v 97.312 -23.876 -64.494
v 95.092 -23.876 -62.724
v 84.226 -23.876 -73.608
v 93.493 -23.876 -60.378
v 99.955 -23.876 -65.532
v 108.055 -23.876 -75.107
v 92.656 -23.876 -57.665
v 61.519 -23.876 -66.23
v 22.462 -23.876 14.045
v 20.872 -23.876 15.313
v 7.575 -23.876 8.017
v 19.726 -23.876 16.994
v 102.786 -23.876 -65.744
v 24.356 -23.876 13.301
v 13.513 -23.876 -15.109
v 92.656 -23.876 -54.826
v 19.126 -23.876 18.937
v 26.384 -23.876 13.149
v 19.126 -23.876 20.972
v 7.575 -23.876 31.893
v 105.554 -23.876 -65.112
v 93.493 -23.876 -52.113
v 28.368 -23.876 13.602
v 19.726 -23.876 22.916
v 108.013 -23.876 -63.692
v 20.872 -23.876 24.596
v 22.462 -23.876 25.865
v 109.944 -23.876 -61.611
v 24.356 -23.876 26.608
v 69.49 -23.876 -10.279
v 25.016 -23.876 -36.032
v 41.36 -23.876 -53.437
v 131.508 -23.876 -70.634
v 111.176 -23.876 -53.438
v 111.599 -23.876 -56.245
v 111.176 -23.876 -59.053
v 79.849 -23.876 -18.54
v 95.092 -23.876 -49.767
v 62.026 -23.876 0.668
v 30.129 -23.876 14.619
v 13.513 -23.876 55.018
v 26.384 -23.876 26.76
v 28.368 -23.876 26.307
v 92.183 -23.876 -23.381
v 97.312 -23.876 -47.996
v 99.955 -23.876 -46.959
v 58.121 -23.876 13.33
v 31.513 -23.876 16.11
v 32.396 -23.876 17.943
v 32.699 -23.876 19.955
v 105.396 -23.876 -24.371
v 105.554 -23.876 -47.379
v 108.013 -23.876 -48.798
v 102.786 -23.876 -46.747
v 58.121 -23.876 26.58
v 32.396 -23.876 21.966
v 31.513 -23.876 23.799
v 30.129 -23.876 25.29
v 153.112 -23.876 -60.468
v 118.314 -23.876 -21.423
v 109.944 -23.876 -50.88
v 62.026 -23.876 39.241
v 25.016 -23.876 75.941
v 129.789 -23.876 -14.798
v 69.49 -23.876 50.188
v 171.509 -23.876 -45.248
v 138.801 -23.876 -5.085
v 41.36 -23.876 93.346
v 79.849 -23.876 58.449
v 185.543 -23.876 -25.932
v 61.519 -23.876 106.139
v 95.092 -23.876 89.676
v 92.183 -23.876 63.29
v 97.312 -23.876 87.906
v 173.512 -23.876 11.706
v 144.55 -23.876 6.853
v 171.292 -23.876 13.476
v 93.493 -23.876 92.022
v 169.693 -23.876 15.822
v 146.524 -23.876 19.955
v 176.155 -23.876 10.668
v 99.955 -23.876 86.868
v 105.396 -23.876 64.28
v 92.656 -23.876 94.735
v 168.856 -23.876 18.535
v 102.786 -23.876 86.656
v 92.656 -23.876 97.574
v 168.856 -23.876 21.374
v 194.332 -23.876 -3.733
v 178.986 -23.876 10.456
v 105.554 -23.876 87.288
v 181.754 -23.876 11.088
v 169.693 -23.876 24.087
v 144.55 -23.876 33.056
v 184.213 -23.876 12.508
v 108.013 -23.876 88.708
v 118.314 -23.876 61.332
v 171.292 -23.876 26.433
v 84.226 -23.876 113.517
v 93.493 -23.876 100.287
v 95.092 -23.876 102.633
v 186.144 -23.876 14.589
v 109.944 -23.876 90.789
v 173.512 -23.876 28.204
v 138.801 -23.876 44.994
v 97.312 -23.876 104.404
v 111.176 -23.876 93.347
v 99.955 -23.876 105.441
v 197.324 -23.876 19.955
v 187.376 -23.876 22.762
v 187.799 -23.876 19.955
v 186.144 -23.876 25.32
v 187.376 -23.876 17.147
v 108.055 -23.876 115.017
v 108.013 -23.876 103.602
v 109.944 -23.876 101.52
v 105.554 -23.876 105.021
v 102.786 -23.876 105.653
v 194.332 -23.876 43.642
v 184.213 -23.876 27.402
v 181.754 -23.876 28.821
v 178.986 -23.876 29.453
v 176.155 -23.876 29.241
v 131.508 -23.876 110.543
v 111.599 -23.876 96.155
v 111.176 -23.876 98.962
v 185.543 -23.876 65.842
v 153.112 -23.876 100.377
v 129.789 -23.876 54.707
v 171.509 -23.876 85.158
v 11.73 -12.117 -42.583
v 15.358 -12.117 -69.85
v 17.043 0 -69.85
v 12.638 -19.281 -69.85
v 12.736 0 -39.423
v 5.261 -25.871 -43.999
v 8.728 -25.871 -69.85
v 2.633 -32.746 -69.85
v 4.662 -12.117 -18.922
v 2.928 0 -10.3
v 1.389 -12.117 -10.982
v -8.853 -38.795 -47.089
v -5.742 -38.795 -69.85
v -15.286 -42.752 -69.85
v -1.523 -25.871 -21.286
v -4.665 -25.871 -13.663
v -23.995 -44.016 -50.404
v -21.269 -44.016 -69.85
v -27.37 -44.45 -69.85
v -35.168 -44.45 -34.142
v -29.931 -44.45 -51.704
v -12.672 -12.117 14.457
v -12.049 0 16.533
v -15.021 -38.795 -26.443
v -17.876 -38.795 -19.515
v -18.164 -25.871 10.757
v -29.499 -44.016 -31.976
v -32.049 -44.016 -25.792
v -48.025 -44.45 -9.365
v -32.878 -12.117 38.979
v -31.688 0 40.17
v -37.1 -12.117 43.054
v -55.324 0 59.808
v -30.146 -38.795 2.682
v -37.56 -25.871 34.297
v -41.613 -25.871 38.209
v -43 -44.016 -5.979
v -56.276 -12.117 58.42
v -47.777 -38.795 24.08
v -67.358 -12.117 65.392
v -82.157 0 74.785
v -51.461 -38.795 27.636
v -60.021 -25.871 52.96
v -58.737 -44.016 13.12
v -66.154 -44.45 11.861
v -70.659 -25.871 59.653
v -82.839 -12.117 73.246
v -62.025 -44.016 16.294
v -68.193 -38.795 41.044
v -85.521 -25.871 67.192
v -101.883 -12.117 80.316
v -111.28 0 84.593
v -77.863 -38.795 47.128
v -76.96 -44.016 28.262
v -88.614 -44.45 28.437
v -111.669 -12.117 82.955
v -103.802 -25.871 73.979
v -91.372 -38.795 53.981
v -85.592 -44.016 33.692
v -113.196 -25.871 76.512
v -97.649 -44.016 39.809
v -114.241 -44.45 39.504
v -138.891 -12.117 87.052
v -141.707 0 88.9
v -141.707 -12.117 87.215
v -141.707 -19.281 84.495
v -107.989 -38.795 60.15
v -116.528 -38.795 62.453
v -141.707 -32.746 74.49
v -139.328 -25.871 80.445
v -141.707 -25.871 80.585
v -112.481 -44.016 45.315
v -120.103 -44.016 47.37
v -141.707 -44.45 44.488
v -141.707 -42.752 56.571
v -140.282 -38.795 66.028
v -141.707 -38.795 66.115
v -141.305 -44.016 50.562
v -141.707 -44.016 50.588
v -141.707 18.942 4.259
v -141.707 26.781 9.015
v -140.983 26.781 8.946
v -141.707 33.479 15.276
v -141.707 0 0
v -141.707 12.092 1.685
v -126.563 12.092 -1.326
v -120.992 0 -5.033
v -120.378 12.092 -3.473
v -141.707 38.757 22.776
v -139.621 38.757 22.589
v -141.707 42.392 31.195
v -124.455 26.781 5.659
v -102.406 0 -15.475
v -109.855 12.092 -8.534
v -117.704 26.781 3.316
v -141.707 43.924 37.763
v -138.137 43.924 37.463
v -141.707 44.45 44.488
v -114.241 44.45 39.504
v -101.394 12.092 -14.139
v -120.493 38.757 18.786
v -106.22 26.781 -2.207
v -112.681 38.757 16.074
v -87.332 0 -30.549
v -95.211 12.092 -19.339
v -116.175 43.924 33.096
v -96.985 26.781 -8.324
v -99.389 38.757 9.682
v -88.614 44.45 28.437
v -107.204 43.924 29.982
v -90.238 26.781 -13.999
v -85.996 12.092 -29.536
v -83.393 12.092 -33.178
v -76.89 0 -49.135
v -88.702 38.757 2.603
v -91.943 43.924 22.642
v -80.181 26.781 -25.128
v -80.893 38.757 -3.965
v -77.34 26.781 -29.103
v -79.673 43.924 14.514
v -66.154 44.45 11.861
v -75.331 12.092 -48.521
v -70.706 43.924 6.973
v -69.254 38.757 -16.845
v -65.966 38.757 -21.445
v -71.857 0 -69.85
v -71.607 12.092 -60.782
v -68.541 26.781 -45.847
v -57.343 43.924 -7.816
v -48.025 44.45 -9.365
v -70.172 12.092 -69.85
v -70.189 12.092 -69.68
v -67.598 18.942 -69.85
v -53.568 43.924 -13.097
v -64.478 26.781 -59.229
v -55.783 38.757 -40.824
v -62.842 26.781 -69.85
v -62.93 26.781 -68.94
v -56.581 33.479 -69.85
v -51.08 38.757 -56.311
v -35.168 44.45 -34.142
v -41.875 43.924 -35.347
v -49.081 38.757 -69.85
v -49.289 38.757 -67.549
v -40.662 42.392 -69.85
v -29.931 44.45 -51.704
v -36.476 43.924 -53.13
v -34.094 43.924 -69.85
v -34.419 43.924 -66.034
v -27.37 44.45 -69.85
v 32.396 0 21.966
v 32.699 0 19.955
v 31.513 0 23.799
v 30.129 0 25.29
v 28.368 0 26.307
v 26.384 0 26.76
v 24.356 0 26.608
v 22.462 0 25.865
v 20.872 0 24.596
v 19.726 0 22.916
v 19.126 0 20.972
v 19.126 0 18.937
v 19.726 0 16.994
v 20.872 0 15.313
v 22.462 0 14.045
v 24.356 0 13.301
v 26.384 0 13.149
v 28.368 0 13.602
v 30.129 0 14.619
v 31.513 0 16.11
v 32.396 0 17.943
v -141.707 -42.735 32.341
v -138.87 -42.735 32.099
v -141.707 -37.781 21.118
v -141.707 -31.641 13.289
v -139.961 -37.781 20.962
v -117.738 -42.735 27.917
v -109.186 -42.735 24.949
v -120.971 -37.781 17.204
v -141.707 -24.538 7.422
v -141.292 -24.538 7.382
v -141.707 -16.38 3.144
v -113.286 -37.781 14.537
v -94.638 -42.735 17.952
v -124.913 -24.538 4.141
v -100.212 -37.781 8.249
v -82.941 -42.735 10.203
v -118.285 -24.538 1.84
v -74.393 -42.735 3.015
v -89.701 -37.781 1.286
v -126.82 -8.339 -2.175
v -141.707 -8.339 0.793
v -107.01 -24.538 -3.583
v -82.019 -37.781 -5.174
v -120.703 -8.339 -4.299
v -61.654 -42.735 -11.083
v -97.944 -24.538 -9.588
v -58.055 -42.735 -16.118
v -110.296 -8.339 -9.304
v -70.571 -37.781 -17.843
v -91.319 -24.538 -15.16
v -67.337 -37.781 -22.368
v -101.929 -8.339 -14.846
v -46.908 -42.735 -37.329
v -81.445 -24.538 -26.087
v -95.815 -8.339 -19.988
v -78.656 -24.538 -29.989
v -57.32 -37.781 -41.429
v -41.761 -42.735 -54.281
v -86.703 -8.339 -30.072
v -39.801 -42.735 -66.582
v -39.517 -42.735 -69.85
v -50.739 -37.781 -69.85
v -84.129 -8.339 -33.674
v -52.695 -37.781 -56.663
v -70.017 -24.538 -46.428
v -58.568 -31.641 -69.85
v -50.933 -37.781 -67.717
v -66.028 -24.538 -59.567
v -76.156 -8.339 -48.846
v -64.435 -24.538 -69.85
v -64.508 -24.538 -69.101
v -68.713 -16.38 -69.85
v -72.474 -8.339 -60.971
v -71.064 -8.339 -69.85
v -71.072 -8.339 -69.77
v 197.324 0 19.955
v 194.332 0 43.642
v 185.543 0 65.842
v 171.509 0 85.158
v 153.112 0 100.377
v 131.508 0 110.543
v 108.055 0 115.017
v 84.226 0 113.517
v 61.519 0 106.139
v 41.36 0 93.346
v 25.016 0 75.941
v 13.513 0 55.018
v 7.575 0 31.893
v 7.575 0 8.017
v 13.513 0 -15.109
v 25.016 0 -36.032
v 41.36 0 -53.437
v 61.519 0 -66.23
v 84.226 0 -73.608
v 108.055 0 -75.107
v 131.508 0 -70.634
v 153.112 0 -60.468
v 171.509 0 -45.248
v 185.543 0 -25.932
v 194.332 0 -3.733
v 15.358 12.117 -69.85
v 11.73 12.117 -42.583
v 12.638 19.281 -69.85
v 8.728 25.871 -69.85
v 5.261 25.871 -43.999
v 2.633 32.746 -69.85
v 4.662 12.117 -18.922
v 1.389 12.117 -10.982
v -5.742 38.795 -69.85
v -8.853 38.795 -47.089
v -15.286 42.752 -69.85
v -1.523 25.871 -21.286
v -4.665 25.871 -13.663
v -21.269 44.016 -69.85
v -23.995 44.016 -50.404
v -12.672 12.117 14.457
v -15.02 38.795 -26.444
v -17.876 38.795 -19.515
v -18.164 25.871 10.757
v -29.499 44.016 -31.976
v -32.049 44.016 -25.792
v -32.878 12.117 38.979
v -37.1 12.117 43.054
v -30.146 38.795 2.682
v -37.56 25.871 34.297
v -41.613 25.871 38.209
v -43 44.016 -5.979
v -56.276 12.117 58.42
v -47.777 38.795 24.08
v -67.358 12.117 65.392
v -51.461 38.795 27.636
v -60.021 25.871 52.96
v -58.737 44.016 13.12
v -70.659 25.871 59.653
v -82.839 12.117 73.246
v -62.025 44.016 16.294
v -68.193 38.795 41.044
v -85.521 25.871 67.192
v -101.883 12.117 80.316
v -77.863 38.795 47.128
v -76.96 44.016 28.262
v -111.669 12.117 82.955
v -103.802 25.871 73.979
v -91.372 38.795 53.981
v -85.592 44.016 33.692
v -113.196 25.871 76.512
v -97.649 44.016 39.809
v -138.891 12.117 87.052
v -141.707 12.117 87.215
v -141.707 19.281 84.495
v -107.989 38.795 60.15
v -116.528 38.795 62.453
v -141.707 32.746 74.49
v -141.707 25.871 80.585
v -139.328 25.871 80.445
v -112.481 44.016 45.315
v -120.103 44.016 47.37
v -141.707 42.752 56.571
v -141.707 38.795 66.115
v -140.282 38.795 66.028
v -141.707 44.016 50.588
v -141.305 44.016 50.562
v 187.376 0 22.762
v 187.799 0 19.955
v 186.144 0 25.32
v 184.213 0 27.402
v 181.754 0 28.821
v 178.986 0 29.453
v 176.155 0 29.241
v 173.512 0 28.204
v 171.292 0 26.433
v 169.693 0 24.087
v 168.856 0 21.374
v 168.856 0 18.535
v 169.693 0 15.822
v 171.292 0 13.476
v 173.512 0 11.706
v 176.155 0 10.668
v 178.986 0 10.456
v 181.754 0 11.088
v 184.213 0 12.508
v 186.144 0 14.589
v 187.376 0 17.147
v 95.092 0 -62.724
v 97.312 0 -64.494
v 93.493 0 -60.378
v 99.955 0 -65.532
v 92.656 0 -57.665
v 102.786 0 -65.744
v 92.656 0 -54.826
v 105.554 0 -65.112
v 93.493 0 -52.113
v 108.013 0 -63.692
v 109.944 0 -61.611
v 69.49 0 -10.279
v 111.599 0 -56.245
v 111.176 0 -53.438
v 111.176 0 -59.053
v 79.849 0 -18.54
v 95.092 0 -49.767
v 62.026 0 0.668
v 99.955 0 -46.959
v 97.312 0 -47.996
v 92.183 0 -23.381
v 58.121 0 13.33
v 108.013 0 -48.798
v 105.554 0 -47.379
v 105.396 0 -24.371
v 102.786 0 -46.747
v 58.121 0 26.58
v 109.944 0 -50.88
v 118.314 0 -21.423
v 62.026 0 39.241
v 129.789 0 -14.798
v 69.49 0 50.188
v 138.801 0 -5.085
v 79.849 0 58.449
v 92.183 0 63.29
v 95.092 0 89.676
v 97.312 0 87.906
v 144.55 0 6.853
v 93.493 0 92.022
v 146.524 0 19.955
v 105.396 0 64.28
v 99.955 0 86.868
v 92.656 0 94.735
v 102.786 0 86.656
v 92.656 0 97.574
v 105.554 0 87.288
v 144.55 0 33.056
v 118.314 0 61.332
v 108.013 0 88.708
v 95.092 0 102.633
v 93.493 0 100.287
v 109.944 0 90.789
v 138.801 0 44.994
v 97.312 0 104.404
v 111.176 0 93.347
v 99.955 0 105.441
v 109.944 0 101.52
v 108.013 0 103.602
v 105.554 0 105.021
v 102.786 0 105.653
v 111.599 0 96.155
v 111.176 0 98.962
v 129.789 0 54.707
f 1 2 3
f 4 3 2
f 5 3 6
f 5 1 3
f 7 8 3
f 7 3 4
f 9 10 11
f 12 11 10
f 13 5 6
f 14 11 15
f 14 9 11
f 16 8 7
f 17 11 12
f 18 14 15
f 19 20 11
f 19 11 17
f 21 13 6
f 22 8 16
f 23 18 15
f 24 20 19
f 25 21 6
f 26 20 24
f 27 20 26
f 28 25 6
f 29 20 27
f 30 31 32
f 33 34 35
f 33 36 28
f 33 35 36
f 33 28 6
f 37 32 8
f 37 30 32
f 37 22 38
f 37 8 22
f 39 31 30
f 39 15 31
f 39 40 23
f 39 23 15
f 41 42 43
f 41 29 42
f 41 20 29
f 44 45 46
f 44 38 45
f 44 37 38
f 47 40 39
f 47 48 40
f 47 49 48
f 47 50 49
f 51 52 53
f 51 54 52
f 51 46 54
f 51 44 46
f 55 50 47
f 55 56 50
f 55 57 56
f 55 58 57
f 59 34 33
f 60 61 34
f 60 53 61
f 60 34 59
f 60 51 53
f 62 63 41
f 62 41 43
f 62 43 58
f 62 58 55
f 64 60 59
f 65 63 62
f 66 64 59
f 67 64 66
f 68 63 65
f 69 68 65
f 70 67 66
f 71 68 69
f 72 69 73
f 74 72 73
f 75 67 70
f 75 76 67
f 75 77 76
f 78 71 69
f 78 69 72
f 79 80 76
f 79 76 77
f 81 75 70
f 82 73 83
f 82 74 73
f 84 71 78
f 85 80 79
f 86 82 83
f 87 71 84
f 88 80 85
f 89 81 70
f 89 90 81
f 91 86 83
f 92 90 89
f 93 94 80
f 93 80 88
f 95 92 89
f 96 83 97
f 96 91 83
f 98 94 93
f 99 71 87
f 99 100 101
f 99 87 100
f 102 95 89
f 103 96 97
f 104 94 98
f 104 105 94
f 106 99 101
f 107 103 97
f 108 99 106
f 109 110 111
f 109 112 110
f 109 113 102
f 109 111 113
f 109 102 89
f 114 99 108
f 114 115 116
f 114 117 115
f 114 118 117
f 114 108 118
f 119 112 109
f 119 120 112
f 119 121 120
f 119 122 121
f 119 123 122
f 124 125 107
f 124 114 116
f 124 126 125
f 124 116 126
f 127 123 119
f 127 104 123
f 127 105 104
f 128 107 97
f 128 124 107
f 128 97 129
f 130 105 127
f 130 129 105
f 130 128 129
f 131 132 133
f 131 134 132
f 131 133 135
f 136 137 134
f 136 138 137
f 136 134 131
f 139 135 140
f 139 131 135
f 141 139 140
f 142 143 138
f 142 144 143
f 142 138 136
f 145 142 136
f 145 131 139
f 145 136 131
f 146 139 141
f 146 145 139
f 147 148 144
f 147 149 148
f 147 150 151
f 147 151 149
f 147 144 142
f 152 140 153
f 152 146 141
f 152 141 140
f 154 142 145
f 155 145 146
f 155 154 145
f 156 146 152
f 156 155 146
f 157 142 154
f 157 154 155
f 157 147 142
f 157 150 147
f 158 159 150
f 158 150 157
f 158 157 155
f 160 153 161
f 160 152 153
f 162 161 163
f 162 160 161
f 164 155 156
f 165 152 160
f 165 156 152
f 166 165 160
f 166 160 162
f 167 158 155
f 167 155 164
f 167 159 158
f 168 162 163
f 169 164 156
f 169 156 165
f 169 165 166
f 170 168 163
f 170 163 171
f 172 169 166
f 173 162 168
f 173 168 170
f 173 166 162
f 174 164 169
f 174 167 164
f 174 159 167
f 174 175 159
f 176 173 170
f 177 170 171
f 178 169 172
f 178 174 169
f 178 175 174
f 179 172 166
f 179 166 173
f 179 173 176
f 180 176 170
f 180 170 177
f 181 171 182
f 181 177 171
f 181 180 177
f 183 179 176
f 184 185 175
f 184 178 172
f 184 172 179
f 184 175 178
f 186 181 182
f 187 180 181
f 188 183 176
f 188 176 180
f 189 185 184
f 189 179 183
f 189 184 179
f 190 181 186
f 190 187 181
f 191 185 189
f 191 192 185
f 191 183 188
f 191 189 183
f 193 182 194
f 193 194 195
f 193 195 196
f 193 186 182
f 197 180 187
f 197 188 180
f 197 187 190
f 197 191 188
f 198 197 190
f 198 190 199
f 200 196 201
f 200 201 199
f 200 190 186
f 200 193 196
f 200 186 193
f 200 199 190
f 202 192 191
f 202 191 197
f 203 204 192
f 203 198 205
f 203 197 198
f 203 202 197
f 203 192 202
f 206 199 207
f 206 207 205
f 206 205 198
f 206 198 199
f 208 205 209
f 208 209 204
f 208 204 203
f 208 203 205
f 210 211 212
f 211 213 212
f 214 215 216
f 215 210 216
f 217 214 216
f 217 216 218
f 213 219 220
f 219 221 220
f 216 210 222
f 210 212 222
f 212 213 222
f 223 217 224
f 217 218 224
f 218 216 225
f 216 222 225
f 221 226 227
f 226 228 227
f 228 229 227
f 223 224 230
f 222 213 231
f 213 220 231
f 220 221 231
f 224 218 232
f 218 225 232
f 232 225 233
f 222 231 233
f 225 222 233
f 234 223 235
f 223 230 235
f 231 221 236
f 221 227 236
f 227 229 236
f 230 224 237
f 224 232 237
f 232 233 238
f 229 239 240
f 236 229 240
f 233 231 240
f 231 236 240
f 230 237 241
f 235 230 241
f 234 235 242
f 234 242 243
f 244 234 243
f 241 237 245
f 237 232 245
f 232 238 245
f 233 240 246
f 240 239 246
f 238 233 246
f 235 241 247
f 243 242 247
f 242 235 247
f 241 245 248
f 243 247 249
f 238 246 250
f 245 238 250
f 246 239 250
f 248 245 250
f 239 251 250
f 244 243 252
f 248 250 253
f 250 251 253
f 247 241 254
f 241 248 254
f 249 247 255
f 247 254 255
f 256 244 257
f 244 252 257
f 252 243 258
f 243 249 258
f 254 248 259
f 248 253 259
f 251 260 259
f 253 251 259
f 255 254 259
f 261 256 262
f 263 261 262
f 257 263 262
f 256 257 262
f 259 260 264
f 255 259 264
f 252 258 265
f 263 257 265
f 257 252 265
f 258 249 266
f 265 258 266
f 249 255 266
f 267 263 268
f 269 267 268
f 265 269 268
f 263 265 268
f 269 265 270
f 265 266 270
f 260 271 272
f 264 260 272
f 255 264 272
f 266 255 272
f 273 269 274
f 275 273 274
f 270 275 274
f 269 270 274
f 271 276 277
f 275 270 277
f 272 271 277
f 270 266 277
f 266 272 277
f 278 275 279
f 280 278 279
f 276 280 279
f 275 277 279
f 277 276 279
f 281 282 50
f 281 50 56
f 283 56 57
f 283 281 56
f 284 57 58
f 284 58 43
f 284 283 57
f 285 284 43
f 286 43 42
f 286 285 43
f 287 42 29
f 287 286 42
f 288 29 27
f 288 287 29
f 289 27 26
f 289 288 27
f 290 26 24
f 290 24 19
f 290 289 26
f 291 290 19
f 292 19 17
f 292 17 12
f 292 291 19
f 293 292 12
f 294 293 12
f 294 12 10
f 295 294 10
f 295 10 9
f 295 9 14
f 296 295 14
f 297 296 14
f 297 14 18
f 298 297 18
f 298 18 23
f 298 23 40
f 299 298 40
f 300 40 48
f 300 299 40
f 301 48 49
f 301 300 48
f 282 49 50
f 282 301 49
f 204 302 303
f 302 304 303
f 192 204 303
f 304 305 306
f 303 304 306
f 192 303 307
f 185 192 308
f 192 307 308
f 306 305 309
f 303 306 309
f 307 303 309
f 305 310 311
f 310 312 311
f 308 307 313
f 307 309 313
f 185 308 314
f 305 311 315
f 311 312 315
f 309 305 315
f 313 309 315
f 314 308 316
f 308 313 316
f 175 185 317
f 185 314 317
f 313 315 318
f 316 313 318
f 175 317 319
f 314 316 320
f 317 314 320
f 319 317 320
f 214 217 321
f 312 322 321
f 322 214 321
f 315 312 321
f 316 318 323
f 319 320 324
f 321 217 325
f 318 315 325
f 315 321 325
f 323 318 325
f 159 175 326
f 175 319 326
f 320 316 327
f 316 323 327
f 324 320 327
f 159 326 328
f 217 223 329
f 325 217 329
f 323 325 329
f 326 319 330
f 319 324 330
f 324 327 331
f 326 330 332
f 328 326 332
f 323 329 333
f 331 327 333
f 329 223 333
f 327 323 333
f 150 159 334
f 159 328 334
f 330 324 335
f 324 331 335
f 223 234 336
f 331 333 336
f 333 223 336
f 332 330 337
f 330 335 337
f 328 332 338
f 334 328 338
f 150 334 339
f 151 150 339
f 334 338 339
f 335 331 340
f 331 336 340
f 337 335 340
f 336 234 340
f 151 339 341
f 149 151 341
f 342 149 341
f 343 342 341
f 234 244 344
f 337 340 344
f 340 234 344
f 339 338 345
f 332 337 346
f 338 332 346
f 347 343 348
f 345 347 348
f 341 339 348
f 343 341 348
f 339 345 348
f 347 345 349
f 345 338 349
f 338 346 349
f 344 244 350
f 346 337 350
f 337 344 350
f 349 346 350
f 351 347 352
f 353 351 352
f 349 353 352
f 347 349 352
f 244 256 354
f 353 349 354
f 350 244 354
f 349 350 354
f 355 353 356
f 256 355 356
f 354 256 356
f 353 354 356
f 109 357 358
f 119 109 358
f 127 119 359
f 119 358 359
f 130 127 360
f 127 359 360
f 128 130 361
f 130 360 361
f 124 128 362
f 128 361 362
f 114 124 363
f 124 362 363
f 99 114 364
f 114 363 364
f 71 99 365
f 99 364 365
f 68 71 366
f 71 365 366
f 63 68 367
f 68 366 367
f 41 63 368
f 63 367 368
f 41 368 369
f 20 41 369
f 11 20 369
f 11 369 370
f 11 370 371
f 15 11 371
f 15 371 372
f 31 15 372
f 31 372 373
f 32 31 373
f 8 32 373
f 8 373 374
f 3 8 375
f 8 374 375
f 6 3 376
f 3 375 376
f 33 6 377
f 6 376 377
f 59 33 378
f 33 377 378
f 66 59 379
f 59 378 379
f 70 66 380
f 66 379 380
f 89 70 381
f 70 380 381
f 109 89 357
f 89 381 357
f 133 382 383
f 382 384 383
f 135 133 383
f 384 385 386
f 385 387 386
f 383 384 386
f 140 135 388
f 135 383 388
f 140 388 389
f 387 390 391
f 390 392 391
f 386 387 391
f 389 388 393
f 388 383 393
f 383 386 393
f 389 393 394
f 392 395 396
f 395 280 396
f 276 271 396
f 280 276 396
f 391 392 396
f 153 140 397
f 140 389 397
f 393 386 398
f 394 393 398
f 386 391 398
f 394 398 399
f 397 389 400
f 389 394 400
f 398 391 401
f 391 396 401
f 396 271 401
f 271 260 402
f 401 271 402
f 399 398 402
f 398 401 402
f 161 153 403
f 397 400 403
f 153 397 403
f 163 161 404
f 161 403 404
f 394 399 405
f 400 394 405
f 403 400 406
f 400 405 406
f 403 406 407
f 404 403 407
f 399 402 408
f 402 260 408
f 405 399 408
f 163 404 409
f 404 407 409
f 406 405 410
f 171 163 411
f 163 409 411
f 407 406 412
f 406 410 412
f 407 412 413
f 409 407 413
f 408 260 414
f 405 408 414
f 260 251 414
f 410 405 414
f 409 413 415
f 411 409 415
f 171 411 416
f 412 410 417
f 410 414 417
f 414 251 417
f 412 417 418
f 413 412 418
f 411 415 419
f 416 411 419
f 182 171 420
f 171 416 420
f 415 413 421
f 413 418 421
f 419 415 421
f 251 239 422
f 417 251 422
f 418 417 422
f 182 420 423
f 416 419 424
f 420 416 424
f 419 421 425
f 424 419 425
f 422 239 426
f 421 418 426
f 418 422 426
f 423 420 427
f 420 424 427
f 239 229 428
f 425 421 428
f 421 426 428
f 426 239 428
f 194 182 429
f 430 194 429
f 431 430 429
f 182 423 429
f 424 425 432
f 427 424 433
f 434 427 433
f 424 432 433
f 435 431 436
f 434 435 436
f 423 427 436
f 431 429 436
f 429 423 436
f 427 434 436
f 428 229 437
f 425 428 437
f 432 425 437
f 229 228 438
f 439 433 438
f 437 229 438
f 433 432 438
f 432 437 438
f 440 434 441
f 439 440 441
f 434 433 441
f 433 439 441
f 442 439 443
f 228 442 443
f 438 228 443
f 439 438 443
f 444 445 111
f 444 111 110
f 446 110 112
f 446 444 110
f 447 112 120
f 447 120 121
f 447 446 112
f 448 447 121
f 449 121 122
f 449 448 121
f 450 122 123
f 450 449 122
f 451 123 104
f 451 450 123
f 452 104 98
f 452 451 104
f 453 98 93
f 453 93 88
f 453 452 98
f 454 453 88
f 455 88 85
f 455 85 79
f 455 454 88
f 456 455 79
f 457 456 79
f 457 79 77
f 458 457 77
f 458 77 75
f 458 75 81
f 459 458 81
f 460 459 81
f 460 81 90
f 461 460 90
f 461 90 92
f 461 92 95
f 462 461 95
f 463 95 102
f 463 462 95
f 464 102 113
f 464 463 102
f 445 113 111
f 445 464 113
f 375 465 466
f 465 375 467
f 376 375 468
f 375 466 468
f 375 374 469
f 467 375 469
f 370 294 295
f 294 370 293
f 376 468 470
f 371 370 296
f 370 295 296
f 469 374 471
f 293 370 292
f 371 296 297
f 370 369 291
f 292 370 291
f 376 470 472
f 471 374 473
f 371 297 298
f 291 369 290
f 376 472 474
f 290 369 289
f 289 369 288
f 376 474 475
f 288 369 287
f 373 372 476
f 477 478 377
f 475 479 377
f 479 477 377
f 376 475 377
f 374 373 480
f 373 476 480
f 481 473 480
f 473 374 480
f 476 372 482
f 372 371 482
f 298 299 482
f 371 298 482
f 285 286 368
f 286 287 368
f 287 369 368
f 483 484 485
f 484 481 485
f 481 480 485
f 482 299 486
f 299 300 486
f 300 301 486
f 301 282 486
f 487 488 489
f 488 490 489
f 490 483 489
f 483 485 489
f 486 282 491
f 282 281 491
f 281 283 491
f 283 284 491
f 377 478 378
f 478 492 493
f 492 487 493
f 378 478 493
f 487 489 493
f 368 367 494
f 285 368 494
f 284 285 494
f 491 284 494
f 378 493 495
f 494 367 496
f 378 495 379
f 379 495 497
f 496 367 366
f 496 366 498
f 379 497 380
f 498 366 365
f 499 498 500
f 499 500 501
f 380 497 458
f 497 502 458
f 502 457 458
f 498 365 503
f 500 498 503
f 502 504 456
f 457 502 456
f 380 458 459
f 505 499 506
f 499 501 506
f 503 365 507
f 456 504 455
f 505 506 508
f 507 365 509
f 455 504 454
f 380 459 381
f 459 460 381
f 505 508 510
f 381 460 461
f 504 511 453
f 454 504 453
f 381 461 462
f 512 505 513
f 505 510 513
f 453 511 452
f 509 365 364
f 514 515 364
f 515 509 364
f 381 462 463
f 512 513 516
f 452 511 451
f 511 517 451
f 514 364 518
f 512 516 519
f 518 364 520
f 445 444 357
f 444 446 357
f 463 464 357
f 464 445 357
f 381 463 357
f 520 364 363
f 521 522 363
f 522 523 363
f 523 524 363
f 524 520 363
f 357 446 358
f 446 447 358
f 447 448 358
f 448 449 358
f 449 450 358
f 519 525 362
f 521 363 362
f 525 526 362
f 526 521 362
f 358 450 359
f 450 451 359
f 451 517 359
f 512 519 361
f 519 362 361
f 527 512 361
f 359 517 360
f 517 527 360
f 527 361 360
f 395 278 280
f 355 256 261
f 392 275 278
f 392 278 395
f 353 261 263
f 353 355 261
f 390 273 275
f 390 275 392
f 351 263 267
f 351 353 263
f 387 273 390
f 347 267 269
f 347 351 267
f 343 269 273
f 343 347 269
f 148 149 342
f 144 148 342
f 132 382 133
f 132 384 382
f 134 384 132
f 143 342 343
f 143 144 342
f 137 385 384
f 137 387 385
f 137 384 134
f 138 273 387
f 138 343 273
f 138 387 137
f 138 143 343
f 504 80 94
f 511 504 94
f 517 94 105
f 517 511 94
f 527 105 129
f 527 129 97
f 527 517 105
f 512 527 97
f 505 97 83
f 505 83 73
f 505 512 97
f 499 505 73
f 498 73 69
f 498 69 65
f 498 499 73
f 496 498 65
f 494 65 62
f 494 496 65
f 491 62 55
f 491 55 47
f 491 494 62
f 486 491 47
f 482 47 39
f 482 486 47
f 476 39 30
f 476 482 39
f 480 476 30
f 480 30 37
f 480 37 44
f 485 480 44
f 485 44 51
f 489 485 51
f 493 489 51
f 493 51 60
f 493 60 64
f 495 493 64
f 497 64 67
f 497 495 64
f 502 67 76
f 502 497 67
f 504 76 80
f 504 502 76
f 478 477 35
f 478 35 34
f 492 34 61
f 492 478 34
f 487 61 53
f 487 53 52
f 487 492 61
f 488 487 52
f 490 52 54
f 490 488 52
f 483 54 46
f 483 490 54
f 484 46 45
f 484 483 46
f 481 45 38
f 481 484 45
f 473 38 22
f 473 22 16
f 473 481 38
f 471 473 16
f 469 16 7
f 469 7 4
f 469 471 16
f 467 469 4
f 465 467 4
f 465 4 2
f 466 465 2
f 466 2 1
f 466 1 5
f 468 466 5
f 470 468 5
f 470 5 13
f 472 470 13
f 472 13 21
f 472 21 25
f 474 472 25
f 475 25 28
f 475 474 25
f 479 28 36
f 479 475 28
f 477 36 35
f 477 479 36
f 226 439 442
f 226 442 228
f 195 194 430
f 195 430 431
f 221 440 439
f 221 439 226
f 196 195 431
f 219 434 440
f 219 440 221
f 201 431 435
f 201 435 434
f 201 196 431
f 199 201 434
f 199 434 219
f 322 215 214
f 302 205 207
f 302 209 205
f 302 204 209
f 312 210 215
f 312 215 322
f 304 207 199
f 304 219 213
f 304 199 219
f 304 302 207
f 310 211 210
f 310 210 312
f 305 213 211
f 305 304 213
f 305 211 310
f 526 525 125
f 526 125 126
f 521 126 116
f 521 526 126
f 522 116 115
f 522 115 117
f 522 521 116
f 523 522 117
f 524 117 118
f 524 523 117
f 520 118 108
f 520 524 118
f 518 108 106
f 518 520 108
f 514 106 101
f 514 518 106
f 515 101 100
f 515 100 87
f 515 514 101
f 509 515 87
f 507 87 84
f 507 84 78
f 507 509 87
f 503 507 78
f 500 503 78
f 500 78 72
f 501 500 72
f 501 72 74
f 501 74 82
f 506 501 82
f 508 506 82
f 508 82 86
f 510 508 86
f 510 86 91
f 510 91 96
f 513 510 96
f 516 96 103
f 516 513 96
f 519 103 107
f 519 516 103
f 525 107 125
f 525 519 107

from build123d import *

# Parameters (mm, degrees)
F1_DEPTH    = 44.45
F2_T2_ANGLE = 160.6979741432
F2_T4_ANGLE = 241.2853924859
F2_T6_ANGLE = 160.6979741432
F2_T8_ANGLE = 241.2853924859
F3_R        = 95.25
F3_R_2      = 9.525
F3_R_3      = 6.8244070411
F3_R_4      = 44.45
F4_DEPTH    = 23.876


# Not quite as in the source:
# - a fillet or chamfer that OpenCascade refuses, or shapes differently, is made with other operations: its cross-section is extruded or revolved along the edge and cut away or added


with BuildPart() as f1:
    # F0 (on Front) → F1 (new body, symmetric)
    with BuildSketch(Plane.XZ):
        with BuildLine():
            Line((-141.7071309926, 88.9), (-141.7071309926, 0))
            ThreePointArc((-141.7071309926, 0), (-94.3529466908, -22.4958156982), (-71.8571309926, -69.85))
            Line((-71.8571309926, -69.85), (-27.4071309926, -69.85))
            Line((-27.4071309926, -69.85), (17.0428690074, -69.85))
            ThreePointArc((17.0428690074, -69.85), (-31.6875363662, 40.1695946264), (-141.7071309926, 88.9))
        make_face()
    extrude(amount=F1_DEPTH, both=True)

    # F2: fillet of radius 44.45 on 4 edges, made by hand

    # F2_s1 → F2_t2 (revolve, cut)
    with BuildSketch(Plane(origin=(-86.9289094925, 0, -122.5517924567), x_dir=(0, 1, 0), z_dir=(-0.5785551991, 0, -0.8156432318))):
        with BuildLine():
            ThreePointArc((0, 89.9560683749), (-31.4308964237, 76.9369647986), (-44.45, 45.5060683749))
            Line((-44.45, 45.5060683749), (-44.45, 89.9560683749))
            Line((-44.45, 89.9560683749), (0, 89.9560683749))
        make_face()
    revolve(axis=Axis((-149.8075815664, -44.45, -77.9504505738), (0, -1, 0)), revolution_arc=F2_T2_ANGLE, mode=Mode.SUBTRACT)

    # F2_s3 → F2_t4 (revolve, cut)
    with BuildSketch(Plane(origin=(-27.8850809272, 0, -108.9421849099), x_dir=(0, 1, 0), z_dir=(-0.2479680397, 0, -0.9687682134))):
        with BuildLine():
            ThreePointArc((-44.45, -248.3074320129), (-31.4308964237, -216.8765355892), (0, -203.8574320129))
            Line((0, -203.8574320129), (-44.45, -203.8574320129))
            Line((-44.45, -203.8574320129), (-44.45, -248.3074320129))
        make_face()
    revolve(axis=Axis((-149.6357477999, -44.45, -77.7786168073), (0, 1, 0)), revolution_arc=F2_T4_ANGLE, mode=Mode.SUBTRACT)

    # F2_s5 → F2_t6 (revolve, cut)
    with BuildSketch(Plane(origin=(-86.9289094925, 0, -122.5517924567), x_dir=(0, 1, 0), z_dir=(-0.5785551991, 0, -0.8156432318))):
        with BuildLine():
            ThreePointArc((0, 89.9560683749), (31.4308964237, 76.9369647986), (44.45, 45.5060683749))
            Line((44.45, 45.5060683749), (44.45, 89.9560683749))
            Line((44.45, 89.9560683749), (0, 89.9560683749))
        make_face()
    revolve(axis=Axis((-149.8075815664, 44.45, -77.9504505738), (0, -1, 0)), revolution_arc=F2_T6_ANGLE, mode=Mode.SUBTRACT)

    # F2_s7 → F2_t8 (revolve, cut)
    with BuildSketch(Plane(origin=(-27.8850809272, 0, -108.9421849099), x_dir=(0, 1, 0), z_dir=(-0.2479680397, 0, -0.9687682134))):
        with BuildLine():
            ThreePointArc((0, -203.8574320129), (31.4308964237, -216.8765355892), (44.45, -248.3074320129))
            Line((44.45, -248.3074320129), (44.45, -203.8574320129))
            Line((44.45, -203.8574320129), (0, -203.8574320129))
        make_face()
    revolve(axis=Axis((-149.6357477999, 44.45, -77.7786168073), (0, 1, 0)), revolution_arc=F2_T8_ANGLE, mode=Mode.SUBTRACT)


with BuildPart() as f4:
    # F3 (on Front) → F4 (new body)
    with BuildSketch(Plane.XZ):
        with Locations((102.0744070411, 19.9546236545)):
            Circle(F3_R)
        with Locations((102.0744070411, -56.2453763455)):
            Circle(F3_R_2, mode=Mode.SUBTRACT)
        with Locations((25.8744070411, 19.9546236545)):
            Circle(F3_R_3, mode=Mode.SUBTRACT)
        with Locations((102.0744070411, 19.9546236545)):
            Circle(F3_R_4, mode=Mode.SUBTRACT)
        with Locations((178.2744070411, 19.9546236545)):
            Circle(F3_R_2, mode=Mode.SUBTRACT)
        with Locations((102.0744070411, 96.1546236545)):
            Circle(F3_R_2, mode=Mode.SUBTRACT)
    extrude(amount=F4_DEPTH)


solid = Compound([f1.part, f4.part])
